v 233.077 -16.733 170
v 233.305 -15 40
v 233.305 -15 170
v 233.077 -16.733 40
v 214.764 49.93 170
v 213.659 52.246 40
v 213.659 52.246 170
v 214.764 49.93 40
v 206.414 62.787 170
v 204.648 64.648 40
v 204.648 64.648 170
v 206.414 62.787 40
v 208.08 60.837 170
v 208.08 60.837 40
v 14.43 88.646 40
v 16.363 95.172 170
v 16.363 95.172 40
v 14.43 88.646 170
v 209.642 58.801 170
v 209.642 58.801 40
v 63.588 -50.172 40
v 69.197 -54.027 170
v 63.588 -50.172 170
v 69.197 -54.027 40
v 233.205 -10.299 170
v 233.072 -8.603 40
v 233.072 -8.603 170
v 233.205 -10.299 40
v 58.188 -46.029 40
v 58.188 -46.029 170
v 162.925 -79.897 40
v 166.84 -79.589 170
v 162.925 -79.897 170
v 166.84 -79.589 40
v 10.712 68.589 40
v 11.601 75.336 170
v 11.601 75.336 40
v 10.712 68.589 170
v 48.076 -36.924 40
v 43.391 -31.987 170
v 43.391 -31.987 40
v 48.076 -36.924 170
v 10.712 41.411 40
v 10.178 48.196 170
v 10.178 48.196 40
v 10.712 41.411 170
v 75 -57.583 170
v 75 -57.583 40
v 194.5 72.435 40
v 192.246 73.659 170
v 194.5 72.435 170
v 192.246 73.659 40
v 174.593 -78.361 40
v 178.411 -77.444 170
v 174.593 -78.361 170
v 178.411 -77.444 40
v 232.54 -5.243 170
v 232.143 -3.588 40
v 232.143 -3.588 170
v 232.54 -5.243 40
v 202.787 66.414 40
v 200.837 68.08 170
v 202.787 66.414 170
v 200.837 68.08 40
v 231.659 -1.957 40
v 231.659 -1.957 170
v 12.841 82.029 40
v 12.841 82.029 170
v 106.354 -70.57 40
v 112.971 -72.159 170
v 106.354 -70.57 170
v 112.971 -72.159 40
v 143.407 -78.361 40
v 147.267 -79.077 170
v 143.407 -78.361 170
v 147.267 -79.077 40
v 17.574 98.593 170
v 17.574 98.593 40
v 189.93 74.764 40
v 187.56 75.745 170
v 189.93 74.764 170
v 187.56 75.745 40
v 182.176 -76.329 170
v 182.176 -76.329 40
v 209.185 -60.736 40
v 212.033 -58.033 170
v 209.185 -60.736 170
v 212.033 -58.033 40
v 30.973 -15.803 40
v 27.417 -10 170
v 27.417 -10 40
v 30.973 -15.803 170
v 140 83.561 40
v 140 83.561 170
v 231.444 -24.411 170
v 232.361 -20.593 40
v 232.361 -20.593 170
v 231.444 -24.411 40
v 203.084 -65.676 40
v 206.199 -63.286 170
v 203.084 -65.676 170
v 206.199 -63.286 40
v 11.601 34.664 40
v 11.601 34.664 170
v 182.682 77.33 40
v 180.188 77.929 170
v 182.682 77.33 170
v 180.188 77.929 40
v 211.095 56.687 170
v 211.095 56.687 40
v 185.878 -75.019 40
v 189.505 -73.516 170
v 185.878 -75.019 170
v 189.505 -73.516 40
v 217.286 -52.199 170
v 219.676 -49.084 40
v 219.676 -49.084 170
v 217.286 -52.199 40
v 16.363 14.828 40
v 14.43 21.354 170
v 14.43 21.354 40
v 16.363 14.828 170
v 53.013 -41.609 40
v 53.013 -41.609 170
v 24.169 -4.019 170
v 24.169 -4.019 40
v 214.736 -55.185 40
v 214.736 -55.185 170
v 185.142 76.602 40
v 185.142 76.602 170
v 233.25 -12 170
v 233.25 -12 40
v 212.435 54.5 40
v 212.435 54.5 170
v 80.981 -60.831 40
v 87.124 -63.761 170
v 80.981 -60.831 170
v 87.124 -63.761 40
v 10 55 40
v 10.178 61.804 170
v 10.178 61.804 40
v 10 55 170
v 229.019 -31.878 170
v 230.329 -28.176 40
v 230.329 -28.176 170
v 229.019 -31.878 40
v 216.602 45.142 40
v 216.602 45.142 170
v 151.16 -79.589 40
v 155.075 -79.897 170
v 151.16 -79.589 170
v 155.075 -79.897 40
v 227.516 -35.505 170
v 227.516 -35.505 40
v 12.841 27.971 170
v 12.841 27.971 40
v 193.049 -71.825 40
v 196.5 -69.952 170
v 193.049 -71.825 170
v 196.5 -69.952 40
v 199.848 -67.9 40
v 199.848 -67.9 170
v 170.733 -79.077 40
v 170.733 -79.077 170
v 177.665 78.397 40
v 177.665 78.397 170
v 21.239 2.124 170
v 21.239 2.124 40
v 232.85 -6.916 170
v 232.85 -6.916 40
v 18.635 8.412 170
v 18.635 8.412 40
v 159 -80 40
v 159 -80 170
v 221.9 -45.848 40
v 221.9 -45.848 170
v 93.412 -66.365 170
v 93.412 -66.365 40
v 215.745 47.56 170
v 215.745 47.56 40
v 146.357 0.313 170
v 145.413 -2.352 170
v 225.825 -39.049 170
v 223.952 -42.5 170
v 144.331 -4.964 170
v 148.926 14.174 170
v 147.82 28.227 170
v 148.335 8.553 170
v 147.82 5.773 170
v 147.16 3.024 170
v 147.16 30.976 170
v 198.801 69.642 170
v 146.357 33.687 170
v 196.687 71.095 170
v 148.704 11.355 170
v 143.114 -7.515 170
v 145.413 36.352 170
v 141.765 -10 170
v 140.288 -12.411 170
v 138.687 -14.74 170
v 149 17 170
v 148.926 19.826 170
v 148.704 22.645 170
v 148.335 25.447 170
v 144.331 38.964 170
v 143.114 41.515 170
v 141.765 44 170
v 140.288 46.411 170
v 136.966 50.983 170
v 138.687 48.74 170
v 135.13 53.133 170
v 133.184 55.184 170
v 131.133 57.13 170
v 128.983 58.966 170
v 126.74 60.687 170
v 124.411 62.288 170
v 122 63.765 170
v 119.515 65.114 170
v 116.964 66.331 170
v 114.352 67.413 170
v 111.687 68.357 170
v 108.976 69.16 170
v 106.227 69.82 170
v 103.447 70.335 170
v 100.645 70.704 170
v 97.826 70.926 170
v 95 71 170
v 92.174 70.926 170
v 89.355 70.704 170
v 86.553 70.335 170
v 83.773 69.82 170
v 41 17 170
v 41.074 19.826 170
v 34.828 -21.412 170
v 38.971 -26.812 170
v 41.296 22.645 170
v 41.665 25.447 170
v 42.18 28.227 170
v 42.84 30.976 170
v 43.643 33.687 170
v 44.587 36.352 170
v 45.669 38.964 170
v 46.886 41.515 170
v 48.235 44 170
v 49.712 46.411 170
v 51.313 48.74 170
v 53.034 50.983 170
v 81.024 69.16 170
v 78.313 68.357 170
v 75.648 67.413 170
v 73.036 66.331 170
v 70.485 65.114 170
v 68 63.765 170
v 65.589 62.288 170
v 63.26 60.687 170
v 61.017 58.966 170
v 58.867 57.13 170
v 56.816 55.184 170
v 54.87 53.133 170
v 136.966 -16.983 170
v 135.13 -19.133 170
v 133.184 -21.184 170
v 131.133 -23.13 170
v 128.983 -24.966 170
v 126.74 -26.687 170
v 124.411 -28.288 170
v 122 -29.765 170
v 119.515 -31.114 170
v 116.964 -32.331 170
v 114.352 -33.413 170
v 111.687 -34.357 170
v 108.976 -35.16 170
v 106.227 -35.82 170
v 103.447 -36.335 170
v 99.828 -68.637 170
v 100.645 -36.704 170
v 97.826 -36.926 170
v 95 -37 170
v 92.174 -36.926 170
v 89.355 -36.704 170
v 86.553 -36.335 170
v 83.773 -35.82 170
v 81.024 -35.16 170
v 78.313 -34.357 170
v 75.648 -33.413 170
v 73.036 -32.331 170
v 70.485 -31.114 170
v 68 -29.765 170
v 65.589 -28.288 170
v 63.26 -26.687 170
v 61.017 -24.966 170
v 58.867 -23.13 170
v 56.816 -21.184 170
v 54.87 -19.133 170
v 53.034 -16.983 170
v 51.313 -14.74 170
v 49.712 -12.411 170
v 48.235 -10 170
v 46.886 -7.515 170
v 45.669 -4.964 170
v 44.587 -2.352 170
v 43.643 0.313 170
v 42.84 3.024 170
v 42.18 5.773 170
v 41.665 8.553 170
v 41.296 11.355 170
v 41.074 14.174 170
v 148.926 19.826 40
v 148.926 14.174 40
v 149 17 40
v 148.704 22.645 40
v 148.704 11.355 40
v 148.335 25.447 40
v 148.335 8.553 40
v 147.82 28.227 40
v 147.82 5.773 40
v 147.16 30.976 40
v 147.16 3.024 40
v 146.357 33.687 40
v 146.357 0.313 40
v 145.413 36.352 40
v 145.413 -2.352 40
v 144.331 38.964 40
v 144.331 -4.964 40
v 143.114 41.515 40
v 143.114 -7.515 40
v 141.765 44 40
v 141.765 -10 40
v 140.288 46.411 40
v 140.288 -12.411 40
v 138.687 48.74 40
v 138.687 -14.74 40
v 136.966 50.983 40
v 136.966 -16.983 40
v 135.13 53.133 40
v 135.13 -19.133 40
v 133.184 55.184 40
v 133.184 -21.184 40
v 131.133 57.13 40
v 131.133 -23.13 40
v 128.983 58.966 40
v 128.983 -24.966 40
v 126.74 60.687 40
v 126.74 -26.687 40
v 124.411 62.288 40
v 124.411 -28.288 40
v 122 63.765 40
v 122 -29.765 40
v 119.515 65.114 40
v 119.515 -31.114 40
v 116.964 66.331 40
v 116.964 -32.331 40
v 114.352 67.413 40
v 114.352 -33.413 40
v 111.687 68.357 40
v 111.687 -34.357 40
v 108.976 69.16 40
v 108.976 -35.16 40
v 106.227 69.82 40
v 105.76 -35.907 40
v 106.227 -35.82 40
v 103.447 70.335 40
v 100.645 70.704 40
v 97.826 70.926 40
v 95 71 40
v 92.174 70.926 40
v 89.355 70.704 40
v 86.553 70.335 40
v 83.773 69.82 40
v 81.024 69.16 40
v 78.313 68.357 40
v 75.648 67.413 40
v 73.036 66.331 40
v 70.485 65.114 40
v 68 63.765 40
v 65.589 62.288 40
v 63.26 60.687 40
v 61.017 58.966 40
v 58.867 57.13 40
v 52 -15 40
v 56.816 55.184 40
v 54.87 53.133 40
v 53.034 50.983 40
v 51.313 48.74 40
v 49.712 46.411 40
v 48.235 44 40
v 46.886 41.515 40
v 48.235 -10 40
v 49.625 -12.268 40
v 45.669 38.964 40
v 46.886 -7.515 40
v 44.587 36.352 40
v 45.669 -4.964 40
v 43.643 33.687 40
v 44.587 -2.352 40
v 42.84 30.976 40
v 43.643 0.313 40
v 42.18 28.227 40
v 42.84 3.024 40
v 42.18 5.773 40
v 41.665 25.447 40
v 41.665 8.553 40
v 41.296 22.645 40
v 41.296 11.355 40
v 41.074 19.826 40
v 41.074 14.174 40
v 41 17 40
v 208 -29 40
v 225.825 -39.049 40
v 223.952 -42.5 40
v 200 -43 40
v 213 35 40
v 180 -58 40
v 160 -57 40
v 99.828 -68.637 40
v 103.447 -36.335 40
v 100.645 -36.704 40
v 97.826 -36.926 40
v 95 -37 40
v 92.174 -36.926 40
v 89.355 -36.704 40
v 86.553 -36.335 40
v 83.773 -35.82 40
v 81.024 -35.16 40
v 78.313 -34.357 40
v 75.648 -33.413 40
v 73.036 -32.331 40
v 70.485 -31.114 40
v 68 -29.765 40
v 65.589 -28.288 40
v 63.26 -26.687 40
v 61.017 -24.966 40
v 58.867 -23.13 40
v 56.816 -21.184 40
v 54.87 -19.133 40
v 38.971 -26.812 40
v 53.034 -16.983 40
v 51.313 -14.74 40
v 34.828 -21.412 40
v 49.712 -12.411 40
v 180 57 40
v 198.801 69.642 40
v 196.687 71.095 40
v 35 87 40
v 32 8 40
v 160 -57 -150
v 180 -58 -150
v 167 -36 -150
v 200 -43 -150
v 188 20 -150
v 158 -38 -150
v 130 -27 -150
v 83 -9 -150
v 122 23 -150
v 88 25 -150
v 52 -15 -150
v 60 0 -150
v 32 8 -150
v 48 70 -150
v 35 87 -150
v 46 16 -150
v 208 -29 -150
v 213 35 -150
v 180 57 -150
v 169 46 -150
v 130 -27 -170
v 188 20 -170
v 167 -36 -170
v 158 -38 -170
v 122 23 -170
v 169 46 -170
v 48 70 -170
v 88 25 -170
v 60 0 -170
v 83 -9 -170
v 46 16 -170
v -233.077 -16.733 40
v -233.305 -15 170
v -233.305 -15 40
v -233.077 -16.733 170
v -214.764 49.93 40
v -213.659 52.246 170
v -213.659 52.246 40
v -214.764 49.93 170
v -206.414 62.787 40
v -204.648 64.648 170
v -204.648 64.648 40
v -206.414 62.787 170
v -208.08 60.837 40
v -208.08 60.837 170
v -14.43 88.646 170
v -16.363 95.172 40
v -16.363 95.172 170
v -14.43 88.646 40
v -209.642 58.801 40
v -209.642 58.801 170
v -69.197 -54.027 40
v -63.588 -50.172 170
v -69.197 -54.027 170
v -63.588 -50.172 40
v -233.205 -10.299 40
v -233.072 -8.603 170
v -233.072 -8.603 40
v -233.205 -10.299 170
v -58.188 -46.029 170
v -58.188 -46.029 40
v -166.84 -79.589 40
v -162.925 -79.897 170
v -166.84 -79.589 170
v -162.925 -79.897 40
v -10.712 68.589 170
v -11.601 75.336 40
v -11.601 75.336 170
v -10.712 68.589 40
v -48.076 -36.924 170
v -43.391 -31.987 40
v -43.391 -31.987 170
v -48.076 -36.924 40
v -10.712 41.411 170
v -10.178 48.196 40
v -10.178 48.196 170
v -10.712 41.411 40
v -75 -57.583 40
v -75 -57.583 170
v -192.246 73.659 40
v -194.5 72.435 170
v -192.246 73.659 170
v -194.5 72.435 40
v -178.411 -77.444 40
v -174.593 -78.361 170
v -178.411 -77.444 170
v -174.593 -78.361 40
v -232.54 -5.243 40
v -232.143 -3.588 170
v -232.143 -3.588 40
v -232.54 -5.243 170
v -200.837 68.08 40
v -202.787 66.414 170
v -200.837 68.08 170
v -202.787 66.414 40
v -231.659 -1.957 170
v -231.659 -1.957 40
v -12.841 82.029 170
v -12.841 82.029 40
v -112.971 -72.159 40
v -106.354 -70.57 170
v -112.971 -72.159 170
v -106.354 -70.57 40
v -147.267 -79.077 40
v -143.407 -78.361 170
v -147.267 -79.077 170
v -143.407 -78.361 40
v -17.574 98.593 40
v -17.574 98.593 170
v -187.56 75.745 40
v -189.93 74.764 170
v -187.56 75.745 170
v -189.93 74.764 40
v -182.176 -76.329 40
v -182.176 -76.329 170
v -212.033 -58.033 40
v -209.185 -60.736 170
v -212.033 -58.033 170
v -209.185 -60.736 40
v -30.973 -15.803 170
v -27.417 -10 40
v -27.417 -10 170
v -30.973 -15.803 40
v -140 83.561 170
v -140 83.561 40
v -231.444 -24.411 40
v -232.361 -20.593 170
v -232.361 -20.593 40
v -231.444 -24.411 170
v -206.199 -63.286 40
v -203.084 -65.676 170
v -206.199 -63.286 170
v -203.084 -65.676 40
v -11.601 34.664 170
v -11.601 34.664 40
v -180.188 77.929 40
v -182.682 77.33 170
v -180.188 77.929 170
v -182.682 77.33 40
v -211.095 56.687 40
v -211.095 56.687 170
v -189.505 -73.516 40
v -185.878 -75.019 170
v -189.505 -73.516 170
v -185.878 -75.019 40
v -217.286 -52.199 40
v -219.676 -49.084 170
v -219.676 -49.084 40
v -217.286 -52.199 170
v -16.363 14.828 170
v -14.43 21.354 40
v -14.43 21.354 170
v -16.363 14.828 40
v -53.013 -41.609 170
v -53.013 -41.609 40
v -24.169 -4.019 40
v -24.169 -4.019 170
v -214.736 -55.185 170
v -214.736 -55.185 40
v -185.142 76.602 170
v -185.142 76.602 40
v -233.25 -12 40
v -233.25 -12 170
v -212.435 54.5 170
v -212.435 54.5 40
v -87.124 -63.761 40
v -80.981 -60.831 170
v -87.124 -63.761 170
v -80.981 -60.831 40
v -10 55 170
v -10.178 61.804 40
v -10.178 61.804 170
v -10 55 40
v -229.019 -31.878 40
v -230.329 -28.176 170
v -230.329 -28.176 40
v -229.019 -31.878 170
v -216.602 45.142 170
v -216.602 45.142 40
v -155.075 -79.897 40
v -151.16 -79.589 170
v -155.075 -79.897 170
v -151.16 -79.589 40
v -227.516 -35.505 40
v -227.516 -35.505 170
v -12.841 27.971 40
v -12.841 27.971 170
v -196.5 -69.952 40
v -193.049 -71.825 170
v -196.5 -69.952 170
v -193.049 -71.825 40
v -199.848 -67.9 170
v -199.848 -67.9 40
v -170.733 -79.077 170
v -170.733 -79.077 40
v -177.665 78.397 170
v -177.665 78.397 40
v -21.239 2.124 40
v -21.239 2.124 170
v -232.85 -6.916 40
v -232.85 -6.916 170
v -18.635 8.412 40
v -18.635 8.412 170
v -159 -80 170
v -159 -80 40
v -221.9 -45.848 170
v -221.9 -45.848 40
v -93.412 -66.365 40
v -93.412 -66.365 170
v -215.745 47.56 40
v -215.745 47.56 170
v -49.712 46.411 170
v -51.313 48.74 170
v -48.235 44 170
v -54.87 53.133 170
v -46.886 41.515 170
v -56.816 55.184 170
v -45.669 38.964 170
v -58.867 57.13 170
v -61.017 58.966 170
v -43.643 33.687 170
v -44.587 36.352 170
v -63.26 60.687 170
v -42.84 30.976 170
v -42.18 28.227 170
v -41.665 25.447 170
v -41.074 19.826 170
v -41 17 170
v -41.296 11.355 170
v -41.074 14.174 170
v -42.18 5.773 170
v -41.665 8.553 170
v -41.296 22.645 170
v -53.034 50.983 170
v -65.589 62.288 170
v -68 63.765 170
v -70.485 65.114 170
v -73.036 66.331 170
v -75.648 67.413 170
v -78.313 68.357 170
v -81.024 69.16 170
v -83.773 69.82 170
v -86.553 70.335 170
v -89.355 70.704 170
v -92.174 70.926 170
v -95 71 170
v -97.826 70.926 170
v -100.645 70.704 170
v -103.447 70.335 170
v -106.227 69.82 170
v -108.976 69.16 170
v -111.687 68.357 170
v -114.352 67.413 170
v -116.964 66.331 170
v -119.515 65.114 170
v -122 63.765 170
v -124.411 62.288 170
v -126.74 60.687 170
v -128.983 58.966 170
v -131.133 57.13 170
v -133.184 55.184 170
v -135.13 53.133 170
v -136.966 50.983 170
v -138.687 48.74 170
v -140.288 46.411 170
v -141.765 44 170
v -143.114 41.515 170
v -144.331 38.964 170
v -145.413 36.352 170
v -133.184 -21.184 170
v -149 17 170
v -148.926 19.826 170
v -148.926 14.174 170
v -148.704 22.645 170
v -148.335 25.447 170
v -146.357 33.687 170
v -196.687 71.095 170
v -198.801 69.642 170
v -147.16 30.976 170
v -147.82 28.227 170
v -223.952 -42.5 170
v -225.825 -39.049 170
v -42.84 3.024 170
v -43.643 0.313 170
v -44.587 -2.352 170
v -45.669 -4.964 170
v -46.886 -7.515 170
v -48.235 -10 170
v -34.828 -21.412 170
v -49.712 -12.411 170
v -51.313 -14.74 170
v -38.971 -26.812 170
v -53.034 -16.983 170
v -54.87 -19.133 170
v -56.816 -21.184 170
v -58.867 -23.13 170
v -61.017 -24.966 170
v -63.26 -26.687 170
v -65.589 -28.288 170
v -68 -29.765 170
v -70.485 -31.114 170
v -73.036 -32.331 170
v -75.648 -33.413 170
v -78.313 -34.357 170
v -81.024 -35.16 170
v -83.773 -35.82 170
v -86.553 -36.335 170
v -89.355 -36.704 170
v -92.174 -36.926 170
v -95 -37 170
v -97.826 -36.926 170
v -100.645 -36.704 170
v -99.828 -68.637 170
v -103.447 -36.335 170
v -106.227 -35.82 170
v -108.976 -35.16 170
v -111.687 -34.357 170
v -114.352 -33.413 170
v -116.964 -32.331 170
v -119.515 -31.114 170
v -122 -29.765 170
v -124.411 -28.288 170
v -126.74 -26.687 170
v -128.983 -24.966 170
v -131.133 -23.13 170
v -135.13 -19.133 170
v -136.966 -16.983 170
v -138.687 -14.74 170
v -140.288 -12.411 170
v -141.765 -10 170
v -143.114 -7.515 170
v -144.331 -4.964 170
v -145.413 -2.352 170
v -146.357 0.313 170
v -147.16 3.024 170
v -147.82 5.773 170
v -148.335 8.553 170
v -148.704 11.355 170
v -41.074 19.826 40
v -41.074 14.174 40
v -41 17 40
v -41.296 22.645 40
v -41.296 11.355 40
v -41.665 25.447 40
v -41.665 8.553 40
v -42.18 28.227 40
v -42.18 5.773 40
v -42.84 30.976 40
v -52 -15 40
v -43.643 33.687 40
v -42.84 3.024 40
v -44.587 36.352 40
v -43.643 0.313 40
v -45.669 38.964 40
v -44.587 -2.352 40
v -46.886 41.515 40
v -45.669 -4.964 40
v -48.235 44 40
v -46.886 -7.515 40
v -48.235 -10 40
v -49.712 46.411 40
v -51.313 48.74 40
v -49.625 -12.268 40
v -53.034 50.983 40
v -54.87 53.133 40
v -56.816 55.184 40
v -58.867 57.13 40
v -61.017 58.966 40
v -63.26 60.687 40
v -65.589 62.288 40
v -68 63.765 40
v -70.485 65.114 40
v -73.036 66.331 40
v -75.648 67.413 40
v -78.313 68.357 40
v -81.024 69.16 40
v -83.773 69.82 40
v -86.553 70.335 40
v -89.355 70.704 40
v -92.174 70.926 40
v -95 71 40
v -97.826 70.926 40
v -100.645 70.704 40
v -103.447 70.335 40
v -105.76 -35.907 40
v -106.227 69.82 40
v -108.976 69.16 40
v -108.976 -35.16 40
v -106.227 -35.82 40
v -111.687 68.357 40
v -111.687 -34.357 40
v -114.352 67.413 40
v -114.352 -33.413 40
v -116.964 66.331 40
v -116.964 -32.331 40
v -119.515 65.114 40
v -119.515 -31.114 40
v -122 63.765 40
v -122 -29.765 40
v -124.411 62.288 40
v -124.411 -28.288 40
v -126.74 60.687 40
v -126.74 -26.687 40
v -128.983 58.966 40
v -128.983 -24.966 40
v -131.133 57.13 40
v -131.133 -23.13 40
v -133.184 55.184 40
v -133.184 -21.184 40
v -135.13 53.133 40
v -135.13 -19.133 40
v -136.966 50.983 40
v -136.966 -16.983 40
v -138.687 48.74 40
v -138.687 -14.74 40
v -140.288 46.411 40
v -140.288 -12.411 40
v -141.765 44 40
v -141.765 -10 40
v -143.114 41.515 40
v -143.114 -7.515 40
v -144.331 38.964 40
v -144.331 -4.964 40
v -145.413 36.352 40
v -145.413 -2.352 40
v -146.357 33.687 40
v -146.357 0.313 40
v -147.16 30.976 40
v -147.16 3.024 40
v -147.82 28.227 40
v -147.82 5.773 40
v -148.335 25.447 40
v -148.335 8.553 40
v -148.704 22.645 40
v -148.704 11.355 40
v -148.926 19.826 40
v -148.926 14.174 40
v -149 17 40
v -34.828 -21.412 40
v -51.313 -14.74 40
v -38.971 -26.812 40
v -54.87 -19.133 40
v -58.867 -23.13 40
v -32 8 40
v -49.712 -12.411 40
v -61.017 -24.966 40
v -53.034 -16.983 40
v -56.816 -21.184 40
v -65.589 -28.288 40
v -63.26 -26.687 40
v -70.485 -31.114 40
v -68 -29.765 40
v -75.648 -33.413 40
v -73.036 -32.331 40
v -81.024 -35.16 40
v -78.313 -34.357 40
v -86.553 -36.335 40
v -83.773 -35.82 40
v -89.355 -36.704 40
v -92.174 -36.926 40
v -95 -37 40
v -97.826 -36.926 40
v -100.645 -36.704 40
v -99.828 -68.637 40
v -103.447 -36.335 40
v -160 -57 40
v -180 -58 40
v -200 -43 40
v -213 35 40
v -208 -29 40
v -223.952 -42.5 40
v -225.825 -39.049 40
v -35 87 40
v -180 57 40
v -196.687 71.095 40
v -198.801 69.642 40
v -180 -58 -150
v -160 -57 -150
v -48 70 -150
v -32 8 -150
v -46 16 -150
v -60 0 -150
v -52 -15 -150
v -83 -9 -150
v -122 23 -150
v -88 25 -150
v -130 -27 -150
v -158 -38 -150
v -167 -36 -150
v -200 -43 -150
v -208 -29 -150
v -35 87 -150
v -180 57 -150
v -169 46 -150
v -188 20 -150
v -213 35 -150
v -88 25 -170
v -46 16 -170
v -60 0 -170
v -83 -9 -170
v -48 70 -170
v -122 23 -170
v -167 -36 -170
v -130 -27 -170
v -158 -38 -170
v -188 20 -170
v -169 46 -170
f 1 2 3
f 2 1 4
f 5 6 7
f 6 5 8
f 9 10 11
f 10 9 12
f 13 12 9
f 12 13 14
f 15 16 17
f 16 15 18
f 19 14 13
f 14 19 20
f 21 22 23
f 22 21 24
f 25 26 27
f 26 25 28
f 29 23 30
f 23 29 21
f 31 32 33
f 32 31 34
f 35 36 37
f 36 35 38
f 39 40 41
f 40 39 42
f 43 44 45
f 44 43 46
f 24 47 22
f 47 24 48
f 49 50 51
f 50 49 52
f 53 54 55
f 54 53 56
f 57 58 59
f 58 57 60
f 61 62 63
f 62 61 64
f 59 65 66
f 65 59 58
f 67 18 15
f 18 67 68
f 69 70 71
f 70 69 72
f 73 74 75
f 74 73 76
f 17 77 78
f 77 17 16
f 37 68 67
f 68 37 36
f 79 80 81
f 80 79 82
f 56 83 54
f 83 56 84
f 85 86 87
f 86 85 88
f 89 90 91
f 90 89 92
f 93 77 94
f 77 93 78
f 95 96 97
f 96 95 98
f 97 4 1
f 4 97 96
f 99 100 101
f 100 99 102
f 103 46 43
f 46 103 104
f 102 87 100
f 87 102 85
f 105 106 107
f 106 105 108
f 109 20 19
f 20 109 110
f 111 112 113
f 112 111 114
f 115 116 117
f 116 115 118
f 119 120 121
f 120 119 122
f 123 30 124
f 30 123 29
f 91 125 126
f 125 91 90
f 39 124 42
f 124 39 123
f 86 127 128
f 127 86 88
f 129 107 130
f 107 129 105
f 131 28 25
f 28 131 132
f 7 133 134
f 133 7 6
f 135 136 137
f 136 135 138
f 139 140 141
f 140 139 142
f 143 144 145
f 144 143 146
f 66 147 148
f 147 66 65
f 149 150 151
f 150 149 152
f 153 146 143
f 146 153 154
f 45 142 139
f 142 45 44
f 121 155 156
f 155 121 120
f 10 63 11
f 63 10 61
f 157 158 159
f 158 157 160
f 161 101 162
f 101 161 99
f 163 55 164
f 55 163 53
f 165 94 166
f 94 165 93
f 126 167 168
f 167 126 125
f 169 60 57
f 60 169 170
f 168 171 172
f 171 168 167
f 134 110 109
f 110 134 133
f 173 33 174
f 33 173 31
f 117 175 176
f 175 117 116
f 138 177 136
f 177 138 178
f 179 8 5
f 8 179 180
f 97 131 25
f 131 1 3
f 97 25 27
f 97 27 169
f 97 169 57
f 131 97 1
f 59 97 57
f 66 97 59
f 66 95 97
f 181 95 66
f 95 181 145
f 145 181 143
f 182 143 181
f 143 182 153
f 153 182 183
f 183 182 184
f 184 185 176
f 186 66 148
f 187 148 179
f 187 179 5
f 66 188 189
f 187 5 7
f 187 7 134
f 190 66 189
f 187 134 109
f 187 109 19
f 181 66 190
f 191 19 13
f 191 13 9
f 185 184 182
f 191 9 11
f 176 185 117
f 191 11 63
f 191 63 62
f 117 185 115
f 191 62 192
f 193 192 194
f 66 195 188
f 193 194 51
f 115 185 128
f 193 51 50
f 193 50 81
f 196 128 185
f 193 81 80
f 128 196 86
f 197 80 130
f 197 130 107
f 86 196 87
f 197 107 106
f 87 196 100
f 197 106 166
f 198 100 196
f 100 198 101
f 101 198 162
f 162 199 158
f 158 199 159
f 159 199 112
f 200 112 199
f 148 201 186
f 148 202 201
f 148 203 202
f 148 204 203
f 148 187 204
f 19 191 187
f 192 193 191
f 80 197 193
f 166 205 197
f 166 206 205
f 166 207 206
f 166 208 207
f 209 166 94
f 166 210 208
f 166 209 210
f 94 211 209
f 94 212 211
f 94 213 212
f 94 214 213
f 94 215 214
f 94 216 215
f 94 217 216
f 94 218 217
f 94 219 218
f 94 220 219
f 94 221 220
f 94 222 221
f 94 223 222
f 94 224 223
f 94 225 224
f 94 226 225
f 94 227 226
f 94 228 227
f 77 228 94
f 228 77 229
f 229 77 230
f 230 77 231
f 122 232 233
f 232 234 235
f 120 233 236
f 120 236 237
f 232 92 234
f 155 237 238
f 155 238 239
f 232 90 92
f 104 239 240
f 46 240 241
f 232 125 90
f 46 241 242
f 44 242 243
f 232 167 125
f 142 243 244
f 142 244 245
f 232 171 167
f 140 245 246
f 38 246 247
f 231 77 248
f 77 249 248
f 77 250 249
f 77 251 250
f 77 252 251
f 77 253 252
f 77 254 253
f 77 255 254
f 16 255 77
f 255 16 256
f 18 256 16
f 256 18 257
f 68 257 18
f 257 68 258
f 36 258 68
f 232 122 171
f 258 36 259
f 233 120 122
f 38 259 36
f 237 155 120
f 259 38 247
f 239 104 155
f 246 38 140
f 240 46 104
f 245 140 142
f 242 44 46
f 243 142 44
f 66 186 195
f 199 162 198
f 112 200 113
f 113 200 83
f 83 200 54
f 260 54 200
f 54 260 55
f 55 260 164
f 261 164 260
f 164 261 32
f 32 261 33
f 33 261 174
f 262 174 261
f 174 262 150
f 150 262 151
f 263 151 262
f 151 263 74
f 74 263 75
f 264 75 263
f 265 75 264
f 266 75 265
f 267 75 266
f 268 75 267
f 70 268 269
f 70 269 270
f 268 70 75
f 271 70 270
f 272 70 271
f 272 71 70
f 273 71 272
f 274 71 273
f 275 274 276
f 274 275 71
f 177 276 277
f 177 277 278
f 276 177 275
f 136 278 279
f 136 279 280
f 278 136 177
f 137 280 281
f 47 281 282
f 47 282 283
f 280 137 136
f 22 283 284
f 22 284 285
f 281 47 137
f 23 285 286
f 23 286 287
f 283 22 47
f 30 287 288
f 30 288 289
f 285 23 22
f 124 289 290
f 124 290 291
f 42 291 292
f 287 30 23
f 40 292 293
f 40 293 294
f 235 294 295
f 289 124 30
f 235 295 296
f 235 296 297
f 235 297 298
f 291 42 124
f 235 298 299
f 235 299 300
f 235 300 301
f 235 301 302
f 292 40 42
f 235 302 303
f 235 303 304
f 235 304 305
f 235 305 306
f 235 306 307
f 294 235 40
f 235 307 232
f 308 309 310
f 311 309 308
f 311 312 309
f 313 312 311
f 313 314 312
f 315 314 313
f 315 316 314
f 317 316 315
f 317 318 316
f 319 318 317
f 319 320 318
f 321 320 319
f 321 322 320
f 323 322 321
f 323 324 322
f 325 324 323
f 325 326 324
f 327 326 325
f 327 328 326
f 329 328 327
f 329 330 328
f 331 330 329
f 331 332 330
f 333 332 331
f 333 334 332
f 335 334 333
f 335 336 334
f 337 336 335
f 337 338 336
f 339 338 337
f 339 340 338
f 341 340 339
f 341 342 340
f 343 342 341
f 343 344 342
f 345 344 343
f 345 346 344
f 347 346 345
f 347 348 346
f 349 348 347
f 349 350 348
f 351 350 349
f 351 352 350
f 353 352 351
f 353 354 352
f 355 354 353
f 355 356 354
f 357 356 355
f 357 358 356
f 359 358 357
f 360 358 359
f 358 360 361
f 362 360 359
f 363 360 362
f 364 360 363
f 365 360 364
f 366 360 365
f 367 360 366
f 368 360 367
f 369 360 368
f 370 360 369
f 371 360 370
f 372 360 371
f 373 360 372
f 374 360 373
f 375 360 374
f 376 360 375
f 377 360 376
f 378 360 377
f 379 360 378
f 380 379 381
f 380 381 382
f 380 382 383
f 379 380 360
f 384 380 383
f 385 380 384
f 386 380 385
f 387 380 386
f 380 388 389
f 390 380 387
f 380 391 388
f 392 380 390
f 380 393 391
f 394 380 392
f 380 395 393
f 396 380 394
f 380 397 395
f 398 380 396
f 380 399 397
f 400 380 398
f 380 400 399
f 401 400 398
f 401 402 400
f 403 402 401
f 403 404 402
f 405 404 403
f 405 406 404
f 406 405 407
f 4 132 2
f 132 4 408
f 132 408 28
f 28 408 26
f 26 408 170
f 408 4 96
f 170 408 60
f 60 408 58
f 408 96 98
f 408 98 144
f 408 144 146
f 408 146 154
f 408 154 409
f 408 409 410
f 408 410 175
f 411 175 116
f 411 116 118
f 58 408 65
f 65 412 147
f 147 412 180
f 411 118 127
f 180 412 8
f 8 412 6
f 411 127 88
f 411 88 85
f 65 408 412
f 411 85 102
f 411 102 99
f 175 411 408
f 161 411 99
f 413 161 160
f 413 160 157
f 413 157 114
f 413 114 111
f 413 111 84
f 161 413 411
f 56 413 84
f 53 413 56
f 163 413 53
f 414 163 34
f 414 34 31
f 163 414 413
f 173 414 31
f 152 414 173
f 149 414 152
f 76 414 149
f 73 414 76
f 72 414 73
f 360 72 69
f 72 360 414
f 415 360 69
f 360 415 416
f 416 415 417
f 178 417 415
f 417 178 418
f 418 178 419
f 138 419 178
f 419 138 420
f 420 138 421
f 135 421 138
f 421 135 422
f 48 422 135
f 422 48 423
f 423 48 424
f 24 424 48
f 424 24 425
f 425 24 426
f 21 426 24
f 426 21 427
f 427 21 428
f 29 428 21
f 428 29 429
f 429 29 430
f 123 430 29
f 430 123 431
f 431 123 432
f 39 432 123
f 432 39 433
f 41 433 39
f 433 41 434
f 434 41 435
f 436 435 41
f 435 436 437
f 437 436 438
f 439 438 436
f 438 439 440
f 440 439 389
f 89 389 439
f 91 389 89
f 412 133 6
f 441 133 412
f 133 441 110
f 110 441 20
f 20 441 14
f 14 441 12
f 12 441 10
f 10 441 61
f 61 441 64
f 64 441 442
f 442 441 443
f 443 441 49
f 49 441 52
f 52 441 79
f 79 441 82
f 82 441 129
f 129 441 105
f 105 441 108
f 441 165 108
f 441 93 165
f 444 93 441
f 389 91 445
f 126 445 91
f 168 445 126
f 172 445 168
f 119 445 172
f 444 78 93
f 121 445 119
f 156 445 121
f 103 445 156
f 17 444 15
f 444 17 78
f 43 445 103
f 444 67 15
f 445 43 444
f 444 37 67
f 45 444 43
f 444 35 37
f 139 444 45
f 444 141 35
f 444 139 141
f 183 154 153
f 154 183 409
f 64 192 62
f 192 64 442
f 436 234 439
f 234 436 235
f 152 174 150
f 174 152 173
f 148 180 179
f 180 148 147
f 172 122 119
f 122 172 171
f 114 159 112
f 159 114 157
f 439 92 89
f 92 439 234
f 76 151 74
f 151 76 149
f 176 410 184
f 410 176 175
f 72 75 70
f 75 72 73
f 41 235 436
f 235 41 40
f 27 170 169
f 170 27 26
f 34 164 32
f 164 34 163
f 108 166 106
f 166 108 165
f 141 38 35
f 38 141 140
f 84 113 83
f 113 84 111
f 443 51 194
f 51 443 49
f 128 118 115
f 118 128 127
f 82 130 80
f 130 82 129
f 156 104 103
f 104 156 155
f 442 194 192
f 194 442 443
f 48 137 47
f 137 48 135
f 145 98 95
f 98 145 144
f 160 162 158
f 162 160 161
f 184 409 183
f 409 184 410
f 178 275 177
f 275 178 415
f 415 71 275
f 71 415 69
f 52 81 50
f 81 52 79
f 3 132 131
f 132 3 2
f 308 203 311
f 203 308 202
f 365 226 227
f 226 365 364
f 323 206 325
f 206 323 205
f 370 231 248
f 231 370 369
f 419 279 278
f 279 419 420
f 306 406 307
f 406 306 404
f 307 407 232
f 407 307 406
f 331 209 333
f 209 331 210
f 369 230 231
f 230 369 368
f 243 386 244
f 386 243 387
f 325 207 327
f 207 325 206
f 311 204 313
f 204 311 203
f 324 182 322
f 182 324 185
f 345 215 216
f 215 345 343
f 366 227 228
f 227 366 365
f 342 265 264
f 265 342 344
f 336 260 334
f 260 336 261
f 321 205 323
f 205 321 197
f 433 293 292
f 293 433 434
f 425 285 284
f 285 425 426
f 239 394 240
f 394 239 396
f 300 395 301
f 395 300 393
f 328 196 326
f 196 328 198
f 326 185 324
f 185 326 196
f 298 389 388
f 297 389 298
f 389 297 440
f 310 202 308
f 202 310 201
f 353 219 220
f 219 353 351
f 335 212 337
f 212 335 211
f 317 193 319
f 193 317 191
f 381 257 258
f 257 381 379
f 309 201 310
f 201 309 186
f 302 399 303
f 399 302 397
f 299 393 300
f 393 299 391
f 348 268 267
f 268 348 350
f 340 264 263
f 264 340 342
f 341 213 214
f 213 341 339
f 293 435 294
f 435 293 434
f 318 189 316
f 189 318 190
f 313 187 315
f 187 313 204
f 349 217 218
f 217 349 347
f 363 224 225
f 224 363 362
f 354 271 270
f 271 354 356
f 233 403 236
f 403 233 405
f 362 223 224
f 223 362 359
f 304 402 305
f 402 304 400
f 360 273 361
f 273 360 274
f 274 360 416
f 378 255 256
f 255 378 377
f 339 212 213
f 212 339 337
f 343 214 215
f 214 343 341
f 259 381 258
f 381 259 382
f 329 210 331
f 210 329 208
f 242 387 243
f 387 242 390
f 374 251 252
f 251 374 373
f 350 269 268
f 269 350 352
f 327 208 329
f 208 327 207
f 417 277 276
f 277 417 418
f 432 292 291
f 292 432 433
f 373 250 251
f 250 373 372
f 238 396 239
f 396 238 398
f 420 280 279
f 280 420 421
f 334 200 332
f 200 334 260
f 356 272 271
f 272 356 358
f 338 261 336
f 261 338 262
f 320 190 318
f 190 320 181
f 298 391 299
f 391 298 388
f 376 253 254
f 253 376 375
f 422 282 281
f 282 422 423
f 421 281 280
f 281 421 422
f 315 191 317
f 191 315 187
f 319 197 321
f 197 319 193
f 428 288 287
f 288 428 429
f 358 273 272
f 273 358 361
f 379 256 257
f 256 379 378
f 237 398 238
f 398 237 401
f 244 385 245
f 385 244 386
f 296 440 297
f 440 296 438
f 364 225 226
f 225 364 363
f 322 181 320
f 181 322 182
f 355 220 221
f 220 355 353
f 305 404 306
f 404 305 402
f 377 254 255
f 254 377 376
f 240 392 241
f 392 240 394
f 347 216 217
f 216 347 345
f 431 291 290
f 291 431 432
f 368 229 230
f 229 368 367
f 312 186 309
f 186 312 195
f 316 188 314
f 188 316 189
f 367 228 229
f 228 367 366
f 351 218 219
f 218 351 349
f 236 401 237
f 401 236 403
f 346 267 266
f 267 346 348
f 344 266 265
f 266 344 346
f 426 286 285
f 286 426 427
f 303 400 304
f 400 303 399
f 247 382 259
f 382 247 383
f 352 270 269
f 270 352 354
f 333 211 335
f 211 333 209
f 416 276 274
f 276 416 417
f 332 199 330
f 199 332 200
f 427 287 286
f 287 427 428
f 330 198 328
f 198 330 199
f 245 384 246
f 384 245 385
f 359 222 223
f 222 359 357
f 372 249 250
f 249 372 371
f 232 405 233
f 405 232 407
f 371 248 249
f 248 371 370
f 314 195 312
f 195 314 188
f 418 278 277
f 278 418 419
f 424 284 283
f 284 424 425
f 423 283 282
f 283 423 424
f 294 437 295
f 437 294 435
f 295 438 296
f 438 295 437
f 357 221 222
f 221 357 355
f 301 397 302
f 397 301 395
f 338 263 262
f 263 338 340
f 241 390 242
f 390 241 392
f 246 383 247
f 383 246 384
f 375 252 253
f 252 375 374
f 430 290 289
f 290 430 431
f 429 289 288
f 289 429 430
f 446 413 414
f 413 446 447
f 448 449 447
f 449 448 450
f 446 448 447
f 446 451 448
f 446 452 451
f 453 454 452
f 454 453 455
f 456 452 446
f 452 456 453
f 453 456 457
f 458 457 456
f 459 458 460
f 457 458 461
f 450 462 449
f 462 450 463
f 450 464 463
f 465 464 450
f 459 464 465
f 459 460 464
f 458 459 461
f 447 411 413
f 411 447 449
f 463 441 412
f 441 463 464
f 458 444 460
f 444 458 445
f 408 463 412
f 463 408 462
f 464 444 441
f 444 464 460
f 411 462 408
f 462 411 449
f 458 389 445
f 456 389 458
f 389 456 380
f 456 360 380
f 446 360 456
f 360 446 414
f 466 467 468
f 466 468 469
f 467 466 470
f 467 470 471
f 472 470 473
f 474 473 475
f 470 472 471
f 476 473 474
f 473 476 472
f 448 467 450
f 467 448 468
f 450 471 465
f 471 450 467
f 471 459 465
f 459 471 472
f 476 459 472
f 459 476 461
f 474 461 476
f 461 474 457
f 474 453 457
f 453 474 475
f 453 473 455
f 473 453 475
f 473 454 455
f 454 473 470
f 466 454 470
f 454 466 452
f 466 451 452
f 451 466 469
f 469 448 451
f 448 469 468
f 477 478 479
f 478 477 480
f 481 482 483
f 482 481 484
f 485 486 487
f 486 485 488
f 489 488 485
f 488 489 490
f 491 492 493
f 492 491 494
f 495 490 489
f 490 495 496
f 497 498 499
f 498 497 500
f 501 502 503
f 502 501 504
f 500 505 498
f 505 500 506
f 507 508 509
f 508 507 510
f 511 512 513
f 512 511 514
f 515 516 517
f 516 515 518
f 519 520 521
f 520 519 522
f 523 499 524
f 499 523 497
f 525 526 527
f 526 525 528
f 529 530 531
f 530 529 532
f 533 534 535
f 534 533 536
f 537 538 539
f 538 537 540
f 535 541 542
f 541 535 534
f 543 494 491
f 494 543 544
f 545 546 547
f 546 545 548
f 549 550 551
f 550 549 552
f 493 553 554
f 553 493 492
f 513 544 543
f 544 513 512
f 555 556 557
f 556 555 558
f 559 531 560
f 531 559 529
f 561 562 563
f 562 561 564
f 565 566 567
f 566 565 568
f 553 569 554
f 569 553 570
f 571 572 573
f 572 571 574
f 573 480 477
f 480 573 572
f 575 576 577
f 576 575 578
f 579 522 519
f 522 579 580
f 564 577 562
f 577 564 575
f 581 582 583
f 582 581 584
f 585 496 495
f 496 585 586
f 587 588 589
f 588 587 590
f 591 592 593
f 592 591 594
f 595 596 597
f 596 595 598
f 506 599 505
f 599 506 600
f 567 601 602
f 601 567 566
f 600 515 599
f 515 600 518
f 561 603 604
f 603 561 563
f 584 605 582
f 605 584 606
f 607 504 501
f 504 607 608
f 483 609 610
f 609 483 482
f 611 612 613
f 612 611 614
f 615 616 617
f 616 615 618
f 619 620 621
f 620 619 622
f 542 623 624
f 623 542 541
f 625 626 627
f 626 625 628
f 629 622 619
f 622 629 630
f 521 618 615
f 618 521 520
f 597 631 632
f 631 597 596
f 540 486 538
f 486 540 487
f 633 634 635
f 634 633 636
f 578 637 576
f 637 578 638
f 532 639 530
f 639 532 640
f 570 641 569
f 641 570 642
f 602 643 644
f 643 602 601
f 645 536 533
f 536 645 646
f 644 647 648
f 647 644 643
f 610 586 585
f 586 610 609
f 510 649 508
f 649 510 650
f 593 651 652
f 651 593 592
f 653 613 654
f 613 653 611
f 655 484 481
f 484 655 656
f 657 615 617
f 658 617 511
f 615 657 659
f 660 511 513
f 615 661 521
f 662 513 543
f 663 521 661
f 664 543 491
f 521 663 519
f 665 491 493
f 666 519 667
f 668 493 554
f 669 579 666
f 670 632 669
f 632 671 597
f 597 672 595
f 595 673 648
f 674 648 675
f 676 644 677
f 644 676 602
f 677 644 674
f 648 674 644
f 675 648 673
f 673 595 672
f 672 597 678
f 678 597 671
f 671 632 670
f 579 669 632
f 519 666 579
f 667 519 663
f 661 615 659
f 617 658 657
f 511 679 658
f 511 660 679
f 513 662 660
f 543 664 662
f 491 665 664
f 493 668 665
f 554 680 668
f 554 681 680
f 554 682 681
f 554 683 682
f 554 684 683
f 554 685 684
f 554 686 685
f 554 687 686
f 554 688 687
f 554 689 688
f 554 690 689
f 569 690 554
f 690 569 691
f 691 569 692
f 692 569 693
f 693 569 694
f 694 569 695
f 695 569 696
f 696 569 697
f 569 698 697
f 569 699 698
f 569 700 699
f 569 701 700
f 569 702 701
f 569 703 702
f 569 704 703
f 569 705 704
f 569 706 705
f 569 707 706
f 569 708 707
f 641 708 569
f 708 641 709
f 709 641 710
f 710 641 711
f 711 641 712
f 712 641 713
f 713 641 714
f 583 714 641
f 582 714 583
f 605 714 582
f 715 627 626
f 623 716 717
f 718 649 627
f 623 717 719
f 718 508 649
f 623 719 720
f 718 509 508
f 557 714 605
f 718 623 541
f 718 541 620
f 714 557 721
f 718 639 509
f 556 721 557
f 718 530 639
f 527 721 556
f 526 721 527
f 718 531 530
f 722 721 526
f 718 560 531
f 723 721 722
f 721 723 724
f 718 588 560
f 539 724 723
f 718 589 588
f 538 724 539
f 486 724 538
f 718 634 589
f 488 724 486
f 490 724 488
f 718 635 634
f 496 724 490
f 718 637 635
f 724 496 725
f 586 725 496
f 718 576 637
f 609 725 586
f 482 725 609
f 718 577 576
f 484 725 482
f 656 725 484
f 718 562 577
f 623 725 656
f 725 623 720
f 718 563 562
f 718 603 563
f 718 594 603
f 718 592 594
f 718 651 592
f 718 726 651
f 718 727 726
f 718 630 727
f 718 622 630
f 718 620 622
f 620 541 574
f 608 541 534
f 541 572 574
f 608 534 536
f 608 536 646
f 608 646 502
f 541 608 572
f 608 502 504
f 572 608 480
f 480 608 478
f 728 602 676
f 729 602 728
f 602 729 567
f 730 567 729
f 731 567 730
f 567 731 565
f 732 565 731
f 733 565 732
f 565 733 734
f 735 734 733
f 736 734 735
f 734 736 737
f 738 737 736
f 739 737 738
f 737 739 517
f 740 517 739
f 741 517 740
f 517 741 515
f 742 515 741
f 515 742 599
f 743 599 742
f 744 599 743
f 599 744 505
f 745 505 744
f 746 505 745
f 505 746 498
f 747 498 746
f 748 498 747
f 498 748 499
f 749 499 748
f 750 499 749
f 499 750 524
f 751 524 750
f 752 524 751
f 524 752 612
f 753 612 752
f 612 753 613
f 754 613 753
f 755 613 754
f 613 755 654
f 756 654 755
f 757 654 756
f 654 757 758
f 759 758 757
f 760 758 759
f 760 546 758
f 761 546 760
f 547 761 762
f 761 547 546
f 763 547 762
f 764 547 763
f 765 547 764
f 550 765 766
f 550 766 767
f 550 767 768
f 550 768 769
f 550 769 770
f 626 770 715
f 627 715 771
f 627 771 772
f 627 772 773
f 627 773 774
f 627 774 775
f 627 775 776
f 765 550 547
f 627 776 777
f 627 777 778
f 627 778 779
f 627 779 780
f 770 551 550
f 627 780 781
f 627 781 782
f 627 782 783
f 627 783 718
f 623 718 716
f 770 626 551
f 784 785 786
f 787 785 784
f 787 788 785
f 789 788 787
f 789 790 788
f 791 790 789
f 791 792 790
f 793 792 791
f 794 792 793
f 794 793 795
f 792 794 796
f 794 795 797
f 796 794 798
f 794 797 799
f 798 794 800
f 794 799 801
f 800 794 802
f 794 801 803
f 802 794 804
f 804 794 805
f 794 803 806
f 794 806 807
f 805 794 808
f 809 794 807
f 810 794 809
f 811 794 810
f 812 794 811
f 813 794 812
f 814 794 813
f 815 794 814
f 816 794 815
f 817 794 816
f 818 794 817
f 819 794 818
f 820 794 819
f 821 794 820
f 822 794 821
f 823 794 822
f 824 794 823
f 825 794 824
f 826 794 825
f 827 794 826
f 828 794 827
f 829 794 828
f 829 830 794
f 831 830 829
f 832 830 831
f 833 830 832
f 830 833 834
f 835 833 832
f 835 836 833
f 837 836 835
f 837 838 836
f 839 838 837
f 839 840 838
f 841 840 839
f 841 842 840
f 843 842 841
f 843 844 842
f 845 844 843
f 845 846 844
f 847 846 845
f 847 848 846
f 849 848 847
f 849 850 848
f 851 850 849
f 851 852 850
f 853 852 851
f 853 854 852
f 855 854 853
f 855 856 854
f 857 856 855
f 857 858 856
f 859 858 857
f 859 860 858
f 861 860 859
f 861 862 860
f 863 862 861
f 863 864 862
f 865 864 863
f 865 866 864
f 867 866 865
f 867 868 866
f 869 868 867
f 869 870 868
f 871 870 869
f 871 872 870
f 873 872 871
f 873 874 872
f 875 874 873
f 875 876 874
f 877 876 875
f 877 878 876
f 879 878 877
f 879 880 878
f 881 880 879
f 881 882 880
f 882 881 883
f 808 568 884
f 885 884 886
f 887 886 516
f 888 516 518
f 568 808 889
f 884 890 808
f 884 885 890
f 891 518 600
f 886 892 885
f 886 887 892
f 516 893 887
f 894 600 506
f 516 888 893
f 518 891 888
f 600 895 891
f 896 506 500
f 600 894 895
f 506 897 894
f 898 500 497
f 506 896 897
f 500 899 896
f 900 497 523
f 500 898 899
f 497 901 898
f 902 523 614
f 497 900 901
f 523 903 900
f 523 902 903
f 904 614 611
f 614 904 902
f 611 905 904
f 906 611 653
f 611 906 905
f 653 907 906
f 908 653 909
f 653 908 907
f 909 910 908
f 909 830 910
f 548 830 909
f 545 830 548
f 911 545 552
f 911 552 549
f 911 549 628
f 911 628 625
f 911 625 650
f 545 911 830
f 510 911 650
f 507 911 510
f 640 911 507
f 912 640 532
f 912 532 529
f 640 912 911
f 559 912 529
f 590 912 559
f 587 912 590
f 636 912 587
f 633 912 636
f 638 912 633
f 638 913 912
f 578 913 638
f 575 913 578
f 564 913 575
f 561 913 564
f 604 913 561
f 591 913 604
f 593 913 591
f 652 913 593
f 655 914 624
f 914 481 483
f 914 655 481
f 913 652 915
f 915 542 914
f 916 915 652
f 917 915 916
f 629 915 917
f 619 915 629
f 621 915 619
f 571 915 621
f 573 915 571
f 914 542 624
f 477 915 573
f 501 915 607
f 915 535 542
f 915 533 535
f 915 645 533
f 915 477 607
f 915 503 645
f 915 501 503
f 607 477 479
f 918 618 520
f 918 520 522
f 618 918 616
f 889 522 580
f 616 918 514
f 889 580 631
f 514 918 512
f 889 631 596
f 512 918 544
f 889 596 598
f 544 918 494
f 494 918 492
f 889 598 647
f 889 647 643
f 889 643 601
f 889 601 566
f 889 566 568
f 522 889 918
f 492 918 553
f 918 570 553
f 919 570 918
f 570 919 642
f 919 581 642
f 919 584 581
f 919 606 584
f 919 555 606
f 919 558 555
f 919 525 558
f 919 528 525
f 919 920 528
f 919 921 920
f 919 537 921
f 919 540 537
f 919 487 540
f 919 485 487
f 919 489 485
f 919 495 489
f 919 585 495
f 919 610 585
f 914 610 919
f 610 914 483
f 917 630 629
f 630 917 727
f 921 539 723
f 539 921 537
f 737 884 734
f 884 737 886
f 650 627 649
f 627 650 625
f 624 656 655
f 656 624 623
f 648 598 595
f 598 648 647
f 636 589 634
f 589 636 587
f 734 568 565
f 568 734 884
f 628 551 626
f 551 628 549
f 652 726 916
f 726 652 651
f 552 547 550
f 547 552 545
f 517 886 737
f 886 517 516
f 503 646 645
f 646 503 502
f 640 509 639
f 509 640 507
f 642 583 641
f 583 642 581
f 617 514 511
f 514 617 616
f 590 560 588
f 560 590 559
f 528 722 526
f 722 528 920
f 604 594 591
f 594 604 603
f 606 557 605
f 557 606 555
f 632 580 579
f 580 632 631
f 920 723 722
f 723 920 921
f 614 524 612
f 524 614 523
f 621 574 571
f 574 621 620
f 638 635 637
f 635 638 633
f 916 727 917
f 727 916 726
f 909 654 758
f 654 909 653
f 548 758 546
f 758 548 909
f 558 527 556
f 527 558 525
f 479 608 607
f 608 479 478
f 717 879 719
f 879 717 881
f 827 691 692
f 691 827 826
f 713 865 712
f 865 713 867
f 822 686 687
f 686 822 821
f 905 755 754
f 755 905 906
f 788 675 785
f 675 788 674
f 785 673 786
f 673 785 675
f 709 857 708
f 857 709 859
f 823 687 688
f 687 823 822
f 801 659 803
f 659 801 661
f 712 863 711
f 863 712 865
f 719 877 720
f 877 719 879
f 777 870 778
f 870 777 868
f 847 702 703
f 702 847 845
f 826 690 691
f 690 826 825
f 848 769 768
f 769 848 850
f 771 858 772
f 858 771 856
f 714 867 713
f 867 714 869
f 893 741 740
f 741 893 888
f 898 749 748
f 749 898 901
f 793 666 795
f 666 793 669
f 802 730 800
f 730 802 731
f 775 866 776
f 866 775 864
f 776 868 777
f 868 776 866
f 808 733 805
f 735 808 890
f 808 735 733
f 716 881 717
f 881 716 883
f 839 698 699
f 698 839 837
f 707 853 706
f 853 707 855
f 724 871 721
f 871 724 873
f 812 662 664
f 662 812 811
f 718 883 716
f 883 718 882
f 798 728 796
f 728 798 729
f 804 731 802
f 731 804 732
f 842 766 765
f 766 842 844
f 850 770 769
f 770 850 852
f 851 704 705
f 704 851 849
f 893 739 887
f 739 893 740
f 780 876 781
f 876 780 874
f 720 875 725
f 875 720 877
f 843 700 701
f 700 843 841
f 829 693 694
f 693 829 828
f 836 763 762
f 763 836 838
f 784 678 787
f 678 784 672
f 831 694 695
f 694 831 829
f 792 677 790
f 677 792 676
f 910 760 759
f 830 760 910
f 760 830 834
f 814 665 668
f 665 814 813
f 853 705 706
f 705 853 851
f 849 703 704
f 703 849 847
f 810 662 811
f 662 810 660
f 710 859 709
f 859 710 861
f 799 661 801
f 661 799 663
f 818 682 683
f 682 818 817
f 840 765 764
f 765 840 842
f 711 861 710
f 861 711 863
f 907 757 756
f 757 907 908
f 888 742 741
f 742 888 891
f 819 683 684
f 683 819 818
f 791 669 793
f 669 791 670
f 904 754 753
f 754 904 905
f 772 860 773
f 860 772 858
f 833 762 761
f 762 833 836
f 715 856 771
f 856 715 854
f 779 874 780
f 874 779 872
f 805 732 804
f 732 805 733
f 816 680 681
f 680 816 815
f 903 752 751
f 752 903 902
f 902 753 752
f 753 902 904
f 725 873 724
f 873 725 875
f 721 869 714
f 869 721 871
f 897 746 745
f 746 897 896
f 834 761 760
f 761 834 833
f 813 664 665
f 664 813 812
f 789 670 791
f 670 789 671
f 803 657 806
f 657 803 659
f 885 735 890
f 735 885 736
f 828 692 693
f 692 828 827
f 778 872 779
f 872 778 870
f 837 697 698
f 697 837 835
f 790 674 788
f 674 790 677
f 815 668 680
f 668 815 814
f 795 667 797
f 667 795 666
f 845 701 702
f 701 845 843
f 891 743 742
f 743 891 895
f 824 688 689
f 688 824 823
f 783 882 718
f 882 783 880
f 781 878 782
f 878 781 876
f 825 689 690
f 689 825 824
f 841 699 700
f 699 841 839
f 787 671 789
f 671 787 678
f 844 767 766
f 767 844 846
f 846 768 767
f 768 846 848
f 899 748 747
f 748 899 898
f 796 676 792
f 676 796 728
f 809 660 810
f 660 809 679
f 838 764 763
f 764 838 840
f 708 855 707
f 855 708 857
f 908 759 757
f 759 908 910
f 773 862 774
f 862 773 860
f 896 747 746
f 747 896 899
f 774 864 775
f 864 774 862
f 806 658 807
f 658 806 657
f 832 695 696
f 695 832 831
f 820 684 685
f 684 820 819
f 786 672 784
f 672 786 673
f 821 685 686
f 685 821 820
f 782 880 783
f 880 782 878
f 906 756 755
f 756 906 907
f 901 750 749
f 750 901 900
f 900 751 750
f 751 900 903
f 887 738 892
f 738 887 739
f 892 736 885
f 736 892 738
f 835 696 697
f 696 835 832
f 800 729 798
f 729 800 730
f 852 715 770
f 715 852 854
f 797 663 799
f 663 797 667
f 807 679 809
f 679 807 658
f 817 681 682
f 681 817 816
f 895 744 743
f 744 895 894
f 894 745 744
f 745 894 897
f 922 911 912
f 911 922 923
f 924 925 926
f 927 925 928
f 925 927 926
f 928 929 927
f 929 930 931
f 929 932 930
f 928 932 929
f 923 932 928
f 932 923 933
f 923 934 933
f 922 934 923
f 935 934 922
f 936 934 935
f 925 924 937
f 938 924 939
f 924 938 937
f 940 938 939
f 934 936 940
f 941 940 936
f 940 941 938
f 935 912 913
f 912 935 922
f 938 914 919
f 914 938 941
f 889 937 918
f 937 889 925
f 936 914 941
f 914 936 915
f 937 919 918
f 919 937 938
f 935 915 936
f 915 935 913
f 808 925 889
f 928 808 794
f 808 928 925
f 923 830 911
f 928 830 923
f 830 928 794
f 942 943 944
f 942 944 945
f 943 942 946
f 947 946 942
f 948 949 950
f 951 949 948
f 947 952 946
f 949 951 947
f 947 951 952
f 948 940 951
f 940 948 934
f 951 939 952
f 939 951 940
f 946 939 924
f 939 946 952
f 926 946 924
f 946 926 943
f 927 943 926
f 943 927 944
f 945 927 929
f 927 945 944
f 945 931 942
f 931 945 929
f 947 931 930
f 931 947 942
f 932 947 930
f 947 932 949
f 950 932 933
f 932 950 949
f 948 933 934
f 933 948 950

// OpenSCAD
front();
translate([0,0,-150])back();

scale([-1,1,1]){
    front();
translate([0,0,-150])back();
}


module front(){
    $fn=120;
translate([0,0,40])
difference(){
hull(){
difference(){
translate([159,-5,0])cylinder(d=150,h=130);
translate([0,-15,0])cube([500,500,500]);
}
translate([170,30,0])cylinder(d=98,h=130);
translate([200.75,-12,0])cylinder(d=65,h=130);

difference(){
translate([140,55,0])cylinder(d=260,h=130);
translate([140,-140,0])cube([500,500,500]);
rotate([0,0,-7])
translate([0,100,0])cube([500,500,500]);
}   
}
translate([95,17,-10])cylinder(d=108,h=220);
}
}

module back(){
    linear_extrude(height=190){
    
    polygon([[35,87],[180,57],[213,35],[208,-29],[200,---43],[180,-58],[160,-57],[52,-15],[32,8]]);
}

translate([0,0,-20])
linear_extrude(height=20,convexity=3){
    
    polygon([[48,70],[169,46],[188,20],[167,-36],[158,---38],[130,-27],[122,23],[88,25],[83,-9],[60,0],[46,16]]);
}
}
